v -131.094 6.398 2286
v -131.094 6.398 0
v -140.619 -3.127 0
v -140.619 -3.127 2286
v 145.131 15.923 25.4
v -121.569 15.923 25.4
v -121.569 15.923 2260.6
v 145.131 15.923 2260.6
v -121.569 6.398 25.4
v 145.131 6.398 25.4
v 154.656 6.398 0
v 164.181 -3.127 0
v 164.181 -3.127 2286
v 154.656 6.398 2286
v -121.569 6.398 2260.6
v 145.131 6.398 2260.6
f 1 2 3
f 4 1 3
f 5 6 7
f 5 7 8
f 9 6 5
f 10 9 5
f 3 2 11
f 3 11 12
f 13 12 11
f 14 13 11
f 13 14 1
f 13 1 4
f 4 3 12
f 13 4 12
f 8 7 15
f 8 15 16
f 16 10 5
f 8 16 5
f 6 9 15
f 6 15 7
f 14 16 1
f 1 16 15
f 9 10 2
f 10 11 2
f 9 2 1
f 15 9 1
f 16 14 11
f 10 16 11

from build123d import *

# Parameters (mm, degrees)
F0_W     = 266.7
F0_H     = 9.525
F1_DEPTH = 2286
F2_DEPTH = 25.4
F3_W     = 266.7
F3_H     = 9.525
F4_DEPTH = 25.4


with BuildPart() as f1:
    # F0 (on Top) → F1 (new body)
    with BuildSketch(Plane.XY):
        with Locations((11.780921, 11.16089)):
            Rectangle(F0_W, F0_H)
        Polygon((-131.094079, 6.39839), (-140.619079, -3.12661), (164.180921, -3.12661), (154.655921, 6.39839), (145.130921, 6.39839), (-121.569079, 6.39839), align=None)
    extrude(amount=F1_DEPTH)

    # F0 (on Top) → F2 (cut)
    with BuildSketch(Plane.XY):
        with Locations((11.780921, 11.16089)):
            Rectangle(F0_W, F0_H)
    extrude(amount=F2_DEPTH, mode=Mode.SUBTRACT)

    # F3 (on face) → F4 (cut)
    with BuildSketch(Plane.XY.offset(2286)):
        with Locations((11.780921, 11.16089)):
            Rectangle(F3_W, F3_H)
    extrude(amount=-F4_DEPTH, mode=Mode.SUBTRACT)


solid = f1.part
